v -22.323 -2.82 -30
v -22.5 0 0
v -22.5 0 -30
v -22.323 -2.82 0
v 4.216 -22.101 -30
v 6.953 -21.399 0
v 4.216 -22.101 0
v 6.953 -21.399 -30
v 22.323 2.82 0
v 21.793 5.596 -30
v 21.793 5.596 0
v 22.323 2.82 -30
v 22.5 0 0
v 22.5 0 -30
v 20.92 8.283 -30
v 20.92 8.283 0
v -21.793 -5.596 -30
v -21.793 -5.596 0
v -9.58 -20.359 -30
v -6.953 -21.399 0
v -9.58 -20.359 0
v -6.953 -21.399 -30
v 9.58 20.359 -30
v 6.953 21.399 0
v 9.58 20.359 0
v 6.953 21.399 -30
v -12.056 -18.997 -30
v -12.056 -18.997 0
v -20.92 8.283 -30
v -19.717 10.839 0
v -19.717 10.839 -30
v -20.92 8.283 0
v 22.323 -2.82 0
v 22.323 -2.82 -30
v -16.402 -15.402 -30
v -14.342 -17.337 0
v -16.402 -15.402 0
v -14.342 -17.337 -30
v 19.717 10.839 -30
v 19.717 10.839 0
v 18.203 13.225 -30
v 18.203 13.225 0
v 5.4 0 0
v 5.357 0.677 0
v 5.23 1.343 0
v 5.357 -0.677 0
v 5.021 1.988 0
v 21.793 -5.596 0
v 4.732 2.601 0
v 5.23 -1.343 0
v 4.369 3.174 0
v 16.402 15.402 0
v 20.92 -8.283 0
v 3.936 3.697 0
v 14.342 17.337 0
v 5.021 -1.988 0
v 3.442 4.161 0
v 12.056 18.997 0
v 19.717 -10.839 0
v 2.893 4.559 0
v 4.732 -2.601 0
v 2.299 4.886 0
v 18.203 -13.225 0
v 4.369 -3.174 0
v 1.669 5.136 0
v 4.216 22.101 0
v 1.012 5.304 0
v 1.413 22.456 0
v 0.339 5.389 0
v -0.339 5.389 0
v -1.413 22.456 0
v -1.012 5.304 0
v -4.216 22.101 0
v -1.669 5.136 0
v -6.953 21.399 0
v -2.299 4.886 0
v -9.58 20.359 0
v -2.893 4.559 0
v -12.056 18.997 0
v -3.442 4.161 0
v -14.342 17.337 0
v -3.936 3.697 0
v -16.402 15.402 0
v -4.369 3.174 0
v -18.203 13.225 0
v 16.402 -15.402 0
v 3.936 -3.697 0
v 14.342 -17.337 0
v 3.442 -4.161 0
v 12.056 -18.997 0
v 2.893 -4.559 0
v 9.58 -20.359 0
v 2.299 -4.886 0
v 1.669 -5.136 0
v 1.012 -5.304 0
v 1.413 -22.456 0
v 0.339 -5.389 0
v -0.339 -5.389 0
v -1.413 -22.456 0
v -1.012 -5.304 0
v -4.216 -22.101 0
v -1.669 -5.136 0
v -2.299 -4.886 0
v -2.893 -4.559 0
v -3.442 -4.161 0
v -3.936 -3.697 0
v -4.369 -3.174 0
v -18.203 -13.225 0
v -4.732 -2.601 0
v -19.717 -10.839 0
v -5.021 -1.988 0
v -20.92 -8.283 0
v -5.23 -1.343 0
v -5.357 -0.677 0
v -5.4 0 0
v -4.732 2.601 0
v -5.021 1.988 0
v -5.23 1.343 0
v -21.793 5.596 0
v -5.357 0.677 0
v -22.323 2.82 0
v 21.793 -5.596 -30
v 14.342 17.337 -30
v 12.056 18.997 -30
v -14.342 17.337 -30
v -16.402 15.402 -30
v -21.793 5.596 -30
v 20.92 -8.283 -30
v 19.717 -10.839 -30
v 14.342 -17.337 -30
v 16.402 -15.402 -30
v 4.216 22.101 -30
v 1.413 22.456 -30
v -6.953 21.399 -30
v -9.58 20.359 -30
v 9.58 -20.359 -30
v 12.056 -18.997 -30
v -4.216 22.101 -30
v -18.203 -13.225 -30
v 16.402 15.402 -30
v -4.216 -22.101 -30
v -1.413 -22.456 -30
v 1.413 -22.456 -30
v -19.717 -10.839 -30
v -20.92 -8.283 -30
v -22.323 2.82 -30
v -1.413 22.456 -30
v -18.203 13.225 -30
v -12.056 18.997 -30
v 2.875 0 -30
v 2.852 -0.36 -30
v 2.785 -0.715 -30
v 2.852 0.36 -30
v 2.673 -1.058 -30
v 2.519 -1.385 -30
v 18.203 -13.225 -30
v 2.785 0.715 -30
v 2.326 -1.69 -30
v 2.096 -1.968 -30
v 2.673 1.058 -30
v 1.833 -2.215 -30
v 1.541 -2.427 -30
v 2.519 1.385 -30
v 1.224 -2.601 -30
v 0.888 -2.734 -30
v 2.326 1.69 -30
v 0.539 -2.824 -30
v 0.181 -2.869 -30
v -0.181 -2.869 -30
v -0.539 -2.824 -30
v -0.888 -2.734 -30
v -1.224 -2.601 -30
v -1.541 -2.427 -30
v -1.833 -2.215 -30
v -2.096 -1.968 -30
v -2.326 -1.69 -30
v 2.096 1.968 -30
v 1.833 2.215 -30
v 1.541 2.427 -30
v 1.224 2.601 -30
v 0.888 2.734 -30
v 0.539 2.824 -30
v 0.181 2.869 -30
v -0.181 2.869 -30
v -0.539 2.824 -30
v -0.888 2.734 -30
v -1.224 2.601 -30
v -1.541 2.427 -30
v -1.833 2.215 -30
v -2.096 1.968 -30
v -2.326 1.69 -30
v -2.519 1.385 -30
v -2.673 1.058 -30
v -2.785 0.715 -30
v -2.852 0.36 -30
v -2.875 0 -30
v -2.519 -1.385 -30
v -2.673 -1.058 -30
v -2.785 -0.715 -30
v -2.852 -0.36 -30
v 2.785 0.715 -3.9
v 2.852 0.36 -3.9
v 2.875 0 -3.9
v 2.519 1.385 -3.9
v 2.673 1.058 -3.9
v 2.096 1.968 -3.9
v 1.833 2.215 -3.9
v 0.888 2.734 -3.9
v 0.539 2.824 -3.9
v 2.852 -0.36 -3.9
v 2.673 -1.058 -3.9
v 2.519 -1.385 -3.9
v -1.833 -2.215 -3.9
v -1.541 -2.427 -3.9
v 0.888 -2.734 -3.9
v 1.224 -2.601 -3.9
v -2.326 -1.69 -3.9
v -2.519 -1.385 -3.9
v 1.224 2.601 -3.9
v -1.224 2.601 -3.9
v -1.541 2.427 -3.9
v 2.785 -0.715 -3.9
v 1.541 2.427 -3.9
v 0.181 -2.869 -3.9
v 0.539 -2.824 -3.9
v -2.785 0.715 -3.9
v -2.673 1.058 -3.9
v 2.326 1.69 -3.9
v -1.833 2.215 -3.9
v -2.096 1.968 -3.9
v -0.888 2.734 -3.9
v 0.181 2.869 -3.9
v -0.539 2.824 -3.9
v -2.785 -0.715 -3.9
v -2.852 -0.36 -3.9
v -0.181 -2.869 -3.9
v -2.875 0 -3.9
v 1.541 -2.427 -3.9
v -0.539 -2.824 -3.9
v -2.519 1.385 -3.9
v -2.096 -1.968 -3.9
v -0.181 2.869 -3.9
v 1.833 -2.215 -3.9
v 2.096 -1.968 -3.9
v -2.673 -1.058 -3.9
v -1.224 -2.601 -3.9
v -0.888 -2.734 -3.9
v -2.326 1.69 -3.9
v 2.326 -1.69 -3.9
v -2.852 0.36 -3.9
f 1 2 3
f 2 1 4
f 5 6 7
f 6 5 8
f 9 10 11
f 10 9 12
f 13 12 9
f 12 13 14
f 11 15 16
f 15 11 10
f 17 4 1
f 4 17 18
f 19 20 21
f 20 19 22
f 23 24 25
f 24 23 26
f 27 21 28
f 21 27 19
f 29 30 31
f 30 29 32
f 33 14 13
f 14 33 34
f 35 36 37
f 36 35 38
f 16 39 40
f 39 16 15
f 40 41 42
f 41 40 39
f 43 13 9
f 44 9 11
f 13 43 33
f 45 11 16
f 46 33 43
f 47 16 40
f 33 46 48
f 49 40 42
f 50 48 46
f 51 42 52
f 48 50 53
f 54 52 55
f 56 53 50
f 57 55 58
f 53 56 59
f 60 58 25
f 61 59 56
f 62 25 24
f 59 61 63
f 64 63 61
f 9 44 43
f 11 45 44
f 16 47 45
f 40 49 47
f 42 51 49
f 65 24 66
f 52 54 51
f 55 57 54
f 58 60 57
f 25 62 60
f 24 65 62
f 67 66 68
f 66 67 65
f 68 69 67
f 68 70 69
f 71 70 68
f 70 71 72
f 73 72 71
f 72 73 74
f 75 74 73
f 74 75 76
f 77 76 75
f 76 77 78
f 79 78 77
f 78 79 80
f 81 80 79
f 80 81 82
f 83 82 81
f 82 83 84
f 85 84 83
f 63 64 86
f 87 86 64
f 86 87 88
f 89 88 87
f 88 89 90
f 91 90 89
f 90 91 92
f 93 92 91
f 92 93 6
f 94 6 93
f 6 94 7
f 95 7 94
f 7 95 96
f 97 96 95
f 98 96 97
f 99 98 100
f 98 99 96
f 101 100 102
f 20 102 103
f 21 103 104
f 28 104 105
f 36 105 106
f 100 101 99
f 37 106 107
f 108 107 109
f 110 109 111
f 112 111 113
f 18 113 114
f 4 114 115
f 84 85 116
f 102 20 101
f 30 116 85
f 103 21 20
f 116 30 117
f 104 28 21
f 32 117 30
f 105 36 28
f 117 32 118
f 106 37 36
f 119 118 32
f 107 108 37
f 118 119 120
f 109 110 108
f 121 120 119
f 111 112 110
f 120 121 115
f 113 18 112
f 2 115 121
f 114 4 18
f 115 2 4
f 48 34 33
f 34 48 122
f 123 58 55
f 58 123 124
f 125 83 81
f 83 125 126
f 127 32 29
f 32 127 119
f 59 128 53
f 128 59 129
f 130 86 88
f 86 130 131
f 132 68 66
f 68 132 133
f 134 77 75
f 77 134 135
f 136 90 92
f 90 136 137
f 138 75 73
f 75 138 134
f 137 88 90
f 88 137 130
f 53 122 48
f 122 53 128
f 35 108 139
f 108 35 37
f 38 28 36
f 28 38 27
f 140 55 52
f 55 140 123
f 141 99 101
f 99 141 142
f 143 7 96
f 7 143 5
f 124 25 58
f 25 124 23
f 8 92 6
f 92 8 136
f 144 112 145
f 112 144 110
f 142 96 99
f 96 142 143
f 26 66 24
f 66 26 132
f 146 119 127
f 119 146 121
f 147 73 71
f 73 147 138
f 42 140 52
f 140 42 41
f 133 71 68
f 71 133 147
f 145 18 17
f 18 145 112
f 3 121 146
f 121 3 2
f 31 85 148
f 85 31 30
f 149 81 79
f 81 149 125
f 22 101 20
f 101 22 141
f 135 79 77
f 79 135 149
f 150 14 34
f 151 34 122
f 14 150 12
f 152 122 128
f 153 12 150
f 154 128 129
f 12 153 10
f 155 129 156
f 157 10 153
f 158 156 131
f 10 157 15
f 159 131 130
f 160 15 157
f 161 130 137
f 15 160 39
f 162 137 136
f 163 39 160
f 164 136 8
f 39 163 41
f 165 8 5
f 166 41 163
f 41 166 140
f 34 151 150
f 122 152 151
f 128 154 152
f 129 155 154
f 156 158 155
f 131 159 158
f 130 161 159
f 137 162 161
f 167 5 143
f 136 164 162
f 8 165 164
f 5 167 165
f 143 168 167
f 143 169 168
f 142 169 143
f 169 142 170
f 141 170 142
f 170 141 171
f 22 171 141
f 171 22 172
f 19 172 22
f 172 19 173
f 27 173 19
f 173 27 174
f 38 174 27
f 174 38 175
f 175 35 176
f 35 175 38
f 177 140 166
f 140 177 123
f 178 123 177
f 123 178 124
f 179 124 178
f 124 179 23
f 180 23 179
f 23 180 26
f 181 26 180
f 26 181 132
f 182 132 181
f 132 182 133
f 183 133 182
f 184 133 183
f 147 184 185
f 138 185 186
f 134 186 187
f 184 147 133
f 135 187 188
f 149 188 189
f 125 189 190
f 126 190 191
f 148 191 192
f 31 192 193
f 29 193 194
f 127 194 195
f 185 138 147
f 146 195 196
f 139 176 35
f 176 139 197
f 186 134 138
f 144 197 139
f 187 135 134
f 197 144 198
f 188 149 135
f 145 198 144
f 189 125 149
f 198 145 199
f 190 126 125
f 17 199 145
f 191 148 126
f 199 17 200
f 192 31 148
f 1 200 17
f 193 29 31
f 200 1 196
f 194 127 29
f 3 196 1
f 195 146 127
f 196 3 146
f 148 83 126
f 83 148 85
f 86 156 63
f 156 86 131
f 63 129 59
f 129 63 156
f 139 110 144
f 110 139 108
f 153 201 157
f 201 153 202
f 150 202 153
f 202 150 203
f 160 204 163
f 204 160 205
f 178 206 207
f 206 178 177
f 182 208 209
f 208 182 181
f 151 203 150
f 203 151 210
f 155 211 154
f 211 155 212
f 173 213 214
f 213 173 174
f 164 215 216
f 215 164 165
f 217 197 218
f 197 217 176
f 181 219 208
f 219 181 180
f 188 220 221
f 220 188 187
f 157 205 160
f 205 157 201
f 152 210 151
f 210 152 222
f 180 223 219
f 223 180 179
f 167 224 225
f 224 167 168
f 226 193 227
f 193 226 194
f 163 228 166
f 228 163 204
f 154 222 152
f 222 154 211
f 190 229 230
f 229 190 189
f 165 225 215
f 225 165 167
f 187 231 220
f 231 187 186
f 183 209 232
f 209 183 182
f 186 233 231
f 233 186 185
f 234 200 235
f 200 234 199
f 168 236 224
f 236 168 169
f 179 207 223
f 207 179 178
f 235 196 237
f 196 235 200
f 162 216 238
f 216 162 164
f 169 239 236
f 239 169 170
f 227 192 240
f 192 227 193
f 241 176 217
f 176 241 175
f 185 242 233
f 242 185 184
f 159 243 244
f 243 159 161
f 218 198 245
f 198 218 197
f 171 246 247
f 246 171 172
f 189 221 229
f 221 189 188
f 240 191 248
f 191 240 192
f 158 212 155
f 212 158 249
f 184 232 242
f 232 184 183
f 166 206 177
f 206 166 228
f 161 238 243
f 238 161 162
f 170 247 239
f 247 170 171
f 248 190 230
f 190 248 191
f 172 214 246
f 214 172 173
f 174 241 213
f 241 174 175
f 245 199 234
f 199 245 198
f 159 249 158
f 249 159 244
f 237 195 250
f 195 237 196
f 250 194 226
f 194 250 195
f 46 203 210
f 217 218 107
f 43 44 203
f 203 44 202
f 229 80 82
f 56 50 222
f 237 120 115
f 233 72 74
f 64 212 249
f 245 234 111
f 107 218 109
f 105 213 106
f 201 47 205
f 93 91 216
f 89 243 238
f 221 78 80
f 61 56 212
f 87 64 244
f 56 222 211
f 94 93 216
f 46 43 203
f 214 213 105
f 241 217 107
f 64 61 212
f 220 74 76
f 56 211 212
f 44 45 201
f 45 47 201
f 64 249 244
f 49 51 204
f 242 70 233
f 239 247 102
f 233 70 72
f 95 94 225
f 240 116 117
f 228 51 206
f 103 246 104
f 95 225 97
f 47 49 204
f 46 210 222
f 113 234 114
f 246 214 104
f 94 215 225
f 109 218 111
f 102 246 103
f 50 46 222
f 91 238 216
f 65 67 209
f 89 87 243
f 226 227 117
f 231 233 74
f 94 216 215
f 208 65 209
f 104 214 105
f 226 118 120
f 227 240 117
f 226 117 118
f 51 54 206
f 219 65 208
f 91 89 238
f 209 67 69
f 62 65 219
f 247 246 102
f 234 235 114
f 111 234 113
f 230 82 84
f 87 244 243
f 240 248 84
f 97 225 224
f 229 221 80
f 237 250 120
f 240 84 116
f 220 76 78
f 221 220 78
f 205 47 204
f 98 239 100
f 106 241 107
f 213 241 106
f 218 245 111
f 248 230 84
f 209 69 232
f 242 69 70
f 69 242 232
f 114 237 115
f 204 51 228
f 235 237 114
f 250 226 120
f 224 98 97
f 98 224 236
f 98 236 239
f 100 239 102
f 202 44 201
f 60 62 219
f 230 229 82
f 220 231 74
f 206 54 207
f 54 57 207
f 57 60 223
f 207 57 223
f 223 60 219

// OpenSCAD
$fn = 50;


difference() {
	union() {
		translate(v = [0, 0, -30.0000000000]) {
			cylinder(h = 30, r = 22.5000000000);
		}
		#translate(v = [0, 0, -33.0000000000]) {
			cylinder(h = 33, r = 2.8750000000);
		}
	}
	union() {
		translate(v = [0, 0, 0]) {
			rotate(a = [0, 0, 0]) {
				difference() {
					union() {
						translate(v = [0, 0, -33.0000000000]) {
							cylinder(h = 33, r = 2.6000000000);
						}
						translate(v = [0, 0, -3.9000000000]) {
							cylinder(h = 3.9000000000, r1 = 2.8750000000, r2 = 5.4000000000);
						}
						translate(v = [0, 0, -33.0000000000]) {
							cylinder(h = 33, r = 2.8750000000);
						}
						translate(v = [0, 0, -33.0000000000]) {
							cylinder(h = 33, r = 2.6000000000);
						}
					}
					union();
				}
			}
		}
	}
}
